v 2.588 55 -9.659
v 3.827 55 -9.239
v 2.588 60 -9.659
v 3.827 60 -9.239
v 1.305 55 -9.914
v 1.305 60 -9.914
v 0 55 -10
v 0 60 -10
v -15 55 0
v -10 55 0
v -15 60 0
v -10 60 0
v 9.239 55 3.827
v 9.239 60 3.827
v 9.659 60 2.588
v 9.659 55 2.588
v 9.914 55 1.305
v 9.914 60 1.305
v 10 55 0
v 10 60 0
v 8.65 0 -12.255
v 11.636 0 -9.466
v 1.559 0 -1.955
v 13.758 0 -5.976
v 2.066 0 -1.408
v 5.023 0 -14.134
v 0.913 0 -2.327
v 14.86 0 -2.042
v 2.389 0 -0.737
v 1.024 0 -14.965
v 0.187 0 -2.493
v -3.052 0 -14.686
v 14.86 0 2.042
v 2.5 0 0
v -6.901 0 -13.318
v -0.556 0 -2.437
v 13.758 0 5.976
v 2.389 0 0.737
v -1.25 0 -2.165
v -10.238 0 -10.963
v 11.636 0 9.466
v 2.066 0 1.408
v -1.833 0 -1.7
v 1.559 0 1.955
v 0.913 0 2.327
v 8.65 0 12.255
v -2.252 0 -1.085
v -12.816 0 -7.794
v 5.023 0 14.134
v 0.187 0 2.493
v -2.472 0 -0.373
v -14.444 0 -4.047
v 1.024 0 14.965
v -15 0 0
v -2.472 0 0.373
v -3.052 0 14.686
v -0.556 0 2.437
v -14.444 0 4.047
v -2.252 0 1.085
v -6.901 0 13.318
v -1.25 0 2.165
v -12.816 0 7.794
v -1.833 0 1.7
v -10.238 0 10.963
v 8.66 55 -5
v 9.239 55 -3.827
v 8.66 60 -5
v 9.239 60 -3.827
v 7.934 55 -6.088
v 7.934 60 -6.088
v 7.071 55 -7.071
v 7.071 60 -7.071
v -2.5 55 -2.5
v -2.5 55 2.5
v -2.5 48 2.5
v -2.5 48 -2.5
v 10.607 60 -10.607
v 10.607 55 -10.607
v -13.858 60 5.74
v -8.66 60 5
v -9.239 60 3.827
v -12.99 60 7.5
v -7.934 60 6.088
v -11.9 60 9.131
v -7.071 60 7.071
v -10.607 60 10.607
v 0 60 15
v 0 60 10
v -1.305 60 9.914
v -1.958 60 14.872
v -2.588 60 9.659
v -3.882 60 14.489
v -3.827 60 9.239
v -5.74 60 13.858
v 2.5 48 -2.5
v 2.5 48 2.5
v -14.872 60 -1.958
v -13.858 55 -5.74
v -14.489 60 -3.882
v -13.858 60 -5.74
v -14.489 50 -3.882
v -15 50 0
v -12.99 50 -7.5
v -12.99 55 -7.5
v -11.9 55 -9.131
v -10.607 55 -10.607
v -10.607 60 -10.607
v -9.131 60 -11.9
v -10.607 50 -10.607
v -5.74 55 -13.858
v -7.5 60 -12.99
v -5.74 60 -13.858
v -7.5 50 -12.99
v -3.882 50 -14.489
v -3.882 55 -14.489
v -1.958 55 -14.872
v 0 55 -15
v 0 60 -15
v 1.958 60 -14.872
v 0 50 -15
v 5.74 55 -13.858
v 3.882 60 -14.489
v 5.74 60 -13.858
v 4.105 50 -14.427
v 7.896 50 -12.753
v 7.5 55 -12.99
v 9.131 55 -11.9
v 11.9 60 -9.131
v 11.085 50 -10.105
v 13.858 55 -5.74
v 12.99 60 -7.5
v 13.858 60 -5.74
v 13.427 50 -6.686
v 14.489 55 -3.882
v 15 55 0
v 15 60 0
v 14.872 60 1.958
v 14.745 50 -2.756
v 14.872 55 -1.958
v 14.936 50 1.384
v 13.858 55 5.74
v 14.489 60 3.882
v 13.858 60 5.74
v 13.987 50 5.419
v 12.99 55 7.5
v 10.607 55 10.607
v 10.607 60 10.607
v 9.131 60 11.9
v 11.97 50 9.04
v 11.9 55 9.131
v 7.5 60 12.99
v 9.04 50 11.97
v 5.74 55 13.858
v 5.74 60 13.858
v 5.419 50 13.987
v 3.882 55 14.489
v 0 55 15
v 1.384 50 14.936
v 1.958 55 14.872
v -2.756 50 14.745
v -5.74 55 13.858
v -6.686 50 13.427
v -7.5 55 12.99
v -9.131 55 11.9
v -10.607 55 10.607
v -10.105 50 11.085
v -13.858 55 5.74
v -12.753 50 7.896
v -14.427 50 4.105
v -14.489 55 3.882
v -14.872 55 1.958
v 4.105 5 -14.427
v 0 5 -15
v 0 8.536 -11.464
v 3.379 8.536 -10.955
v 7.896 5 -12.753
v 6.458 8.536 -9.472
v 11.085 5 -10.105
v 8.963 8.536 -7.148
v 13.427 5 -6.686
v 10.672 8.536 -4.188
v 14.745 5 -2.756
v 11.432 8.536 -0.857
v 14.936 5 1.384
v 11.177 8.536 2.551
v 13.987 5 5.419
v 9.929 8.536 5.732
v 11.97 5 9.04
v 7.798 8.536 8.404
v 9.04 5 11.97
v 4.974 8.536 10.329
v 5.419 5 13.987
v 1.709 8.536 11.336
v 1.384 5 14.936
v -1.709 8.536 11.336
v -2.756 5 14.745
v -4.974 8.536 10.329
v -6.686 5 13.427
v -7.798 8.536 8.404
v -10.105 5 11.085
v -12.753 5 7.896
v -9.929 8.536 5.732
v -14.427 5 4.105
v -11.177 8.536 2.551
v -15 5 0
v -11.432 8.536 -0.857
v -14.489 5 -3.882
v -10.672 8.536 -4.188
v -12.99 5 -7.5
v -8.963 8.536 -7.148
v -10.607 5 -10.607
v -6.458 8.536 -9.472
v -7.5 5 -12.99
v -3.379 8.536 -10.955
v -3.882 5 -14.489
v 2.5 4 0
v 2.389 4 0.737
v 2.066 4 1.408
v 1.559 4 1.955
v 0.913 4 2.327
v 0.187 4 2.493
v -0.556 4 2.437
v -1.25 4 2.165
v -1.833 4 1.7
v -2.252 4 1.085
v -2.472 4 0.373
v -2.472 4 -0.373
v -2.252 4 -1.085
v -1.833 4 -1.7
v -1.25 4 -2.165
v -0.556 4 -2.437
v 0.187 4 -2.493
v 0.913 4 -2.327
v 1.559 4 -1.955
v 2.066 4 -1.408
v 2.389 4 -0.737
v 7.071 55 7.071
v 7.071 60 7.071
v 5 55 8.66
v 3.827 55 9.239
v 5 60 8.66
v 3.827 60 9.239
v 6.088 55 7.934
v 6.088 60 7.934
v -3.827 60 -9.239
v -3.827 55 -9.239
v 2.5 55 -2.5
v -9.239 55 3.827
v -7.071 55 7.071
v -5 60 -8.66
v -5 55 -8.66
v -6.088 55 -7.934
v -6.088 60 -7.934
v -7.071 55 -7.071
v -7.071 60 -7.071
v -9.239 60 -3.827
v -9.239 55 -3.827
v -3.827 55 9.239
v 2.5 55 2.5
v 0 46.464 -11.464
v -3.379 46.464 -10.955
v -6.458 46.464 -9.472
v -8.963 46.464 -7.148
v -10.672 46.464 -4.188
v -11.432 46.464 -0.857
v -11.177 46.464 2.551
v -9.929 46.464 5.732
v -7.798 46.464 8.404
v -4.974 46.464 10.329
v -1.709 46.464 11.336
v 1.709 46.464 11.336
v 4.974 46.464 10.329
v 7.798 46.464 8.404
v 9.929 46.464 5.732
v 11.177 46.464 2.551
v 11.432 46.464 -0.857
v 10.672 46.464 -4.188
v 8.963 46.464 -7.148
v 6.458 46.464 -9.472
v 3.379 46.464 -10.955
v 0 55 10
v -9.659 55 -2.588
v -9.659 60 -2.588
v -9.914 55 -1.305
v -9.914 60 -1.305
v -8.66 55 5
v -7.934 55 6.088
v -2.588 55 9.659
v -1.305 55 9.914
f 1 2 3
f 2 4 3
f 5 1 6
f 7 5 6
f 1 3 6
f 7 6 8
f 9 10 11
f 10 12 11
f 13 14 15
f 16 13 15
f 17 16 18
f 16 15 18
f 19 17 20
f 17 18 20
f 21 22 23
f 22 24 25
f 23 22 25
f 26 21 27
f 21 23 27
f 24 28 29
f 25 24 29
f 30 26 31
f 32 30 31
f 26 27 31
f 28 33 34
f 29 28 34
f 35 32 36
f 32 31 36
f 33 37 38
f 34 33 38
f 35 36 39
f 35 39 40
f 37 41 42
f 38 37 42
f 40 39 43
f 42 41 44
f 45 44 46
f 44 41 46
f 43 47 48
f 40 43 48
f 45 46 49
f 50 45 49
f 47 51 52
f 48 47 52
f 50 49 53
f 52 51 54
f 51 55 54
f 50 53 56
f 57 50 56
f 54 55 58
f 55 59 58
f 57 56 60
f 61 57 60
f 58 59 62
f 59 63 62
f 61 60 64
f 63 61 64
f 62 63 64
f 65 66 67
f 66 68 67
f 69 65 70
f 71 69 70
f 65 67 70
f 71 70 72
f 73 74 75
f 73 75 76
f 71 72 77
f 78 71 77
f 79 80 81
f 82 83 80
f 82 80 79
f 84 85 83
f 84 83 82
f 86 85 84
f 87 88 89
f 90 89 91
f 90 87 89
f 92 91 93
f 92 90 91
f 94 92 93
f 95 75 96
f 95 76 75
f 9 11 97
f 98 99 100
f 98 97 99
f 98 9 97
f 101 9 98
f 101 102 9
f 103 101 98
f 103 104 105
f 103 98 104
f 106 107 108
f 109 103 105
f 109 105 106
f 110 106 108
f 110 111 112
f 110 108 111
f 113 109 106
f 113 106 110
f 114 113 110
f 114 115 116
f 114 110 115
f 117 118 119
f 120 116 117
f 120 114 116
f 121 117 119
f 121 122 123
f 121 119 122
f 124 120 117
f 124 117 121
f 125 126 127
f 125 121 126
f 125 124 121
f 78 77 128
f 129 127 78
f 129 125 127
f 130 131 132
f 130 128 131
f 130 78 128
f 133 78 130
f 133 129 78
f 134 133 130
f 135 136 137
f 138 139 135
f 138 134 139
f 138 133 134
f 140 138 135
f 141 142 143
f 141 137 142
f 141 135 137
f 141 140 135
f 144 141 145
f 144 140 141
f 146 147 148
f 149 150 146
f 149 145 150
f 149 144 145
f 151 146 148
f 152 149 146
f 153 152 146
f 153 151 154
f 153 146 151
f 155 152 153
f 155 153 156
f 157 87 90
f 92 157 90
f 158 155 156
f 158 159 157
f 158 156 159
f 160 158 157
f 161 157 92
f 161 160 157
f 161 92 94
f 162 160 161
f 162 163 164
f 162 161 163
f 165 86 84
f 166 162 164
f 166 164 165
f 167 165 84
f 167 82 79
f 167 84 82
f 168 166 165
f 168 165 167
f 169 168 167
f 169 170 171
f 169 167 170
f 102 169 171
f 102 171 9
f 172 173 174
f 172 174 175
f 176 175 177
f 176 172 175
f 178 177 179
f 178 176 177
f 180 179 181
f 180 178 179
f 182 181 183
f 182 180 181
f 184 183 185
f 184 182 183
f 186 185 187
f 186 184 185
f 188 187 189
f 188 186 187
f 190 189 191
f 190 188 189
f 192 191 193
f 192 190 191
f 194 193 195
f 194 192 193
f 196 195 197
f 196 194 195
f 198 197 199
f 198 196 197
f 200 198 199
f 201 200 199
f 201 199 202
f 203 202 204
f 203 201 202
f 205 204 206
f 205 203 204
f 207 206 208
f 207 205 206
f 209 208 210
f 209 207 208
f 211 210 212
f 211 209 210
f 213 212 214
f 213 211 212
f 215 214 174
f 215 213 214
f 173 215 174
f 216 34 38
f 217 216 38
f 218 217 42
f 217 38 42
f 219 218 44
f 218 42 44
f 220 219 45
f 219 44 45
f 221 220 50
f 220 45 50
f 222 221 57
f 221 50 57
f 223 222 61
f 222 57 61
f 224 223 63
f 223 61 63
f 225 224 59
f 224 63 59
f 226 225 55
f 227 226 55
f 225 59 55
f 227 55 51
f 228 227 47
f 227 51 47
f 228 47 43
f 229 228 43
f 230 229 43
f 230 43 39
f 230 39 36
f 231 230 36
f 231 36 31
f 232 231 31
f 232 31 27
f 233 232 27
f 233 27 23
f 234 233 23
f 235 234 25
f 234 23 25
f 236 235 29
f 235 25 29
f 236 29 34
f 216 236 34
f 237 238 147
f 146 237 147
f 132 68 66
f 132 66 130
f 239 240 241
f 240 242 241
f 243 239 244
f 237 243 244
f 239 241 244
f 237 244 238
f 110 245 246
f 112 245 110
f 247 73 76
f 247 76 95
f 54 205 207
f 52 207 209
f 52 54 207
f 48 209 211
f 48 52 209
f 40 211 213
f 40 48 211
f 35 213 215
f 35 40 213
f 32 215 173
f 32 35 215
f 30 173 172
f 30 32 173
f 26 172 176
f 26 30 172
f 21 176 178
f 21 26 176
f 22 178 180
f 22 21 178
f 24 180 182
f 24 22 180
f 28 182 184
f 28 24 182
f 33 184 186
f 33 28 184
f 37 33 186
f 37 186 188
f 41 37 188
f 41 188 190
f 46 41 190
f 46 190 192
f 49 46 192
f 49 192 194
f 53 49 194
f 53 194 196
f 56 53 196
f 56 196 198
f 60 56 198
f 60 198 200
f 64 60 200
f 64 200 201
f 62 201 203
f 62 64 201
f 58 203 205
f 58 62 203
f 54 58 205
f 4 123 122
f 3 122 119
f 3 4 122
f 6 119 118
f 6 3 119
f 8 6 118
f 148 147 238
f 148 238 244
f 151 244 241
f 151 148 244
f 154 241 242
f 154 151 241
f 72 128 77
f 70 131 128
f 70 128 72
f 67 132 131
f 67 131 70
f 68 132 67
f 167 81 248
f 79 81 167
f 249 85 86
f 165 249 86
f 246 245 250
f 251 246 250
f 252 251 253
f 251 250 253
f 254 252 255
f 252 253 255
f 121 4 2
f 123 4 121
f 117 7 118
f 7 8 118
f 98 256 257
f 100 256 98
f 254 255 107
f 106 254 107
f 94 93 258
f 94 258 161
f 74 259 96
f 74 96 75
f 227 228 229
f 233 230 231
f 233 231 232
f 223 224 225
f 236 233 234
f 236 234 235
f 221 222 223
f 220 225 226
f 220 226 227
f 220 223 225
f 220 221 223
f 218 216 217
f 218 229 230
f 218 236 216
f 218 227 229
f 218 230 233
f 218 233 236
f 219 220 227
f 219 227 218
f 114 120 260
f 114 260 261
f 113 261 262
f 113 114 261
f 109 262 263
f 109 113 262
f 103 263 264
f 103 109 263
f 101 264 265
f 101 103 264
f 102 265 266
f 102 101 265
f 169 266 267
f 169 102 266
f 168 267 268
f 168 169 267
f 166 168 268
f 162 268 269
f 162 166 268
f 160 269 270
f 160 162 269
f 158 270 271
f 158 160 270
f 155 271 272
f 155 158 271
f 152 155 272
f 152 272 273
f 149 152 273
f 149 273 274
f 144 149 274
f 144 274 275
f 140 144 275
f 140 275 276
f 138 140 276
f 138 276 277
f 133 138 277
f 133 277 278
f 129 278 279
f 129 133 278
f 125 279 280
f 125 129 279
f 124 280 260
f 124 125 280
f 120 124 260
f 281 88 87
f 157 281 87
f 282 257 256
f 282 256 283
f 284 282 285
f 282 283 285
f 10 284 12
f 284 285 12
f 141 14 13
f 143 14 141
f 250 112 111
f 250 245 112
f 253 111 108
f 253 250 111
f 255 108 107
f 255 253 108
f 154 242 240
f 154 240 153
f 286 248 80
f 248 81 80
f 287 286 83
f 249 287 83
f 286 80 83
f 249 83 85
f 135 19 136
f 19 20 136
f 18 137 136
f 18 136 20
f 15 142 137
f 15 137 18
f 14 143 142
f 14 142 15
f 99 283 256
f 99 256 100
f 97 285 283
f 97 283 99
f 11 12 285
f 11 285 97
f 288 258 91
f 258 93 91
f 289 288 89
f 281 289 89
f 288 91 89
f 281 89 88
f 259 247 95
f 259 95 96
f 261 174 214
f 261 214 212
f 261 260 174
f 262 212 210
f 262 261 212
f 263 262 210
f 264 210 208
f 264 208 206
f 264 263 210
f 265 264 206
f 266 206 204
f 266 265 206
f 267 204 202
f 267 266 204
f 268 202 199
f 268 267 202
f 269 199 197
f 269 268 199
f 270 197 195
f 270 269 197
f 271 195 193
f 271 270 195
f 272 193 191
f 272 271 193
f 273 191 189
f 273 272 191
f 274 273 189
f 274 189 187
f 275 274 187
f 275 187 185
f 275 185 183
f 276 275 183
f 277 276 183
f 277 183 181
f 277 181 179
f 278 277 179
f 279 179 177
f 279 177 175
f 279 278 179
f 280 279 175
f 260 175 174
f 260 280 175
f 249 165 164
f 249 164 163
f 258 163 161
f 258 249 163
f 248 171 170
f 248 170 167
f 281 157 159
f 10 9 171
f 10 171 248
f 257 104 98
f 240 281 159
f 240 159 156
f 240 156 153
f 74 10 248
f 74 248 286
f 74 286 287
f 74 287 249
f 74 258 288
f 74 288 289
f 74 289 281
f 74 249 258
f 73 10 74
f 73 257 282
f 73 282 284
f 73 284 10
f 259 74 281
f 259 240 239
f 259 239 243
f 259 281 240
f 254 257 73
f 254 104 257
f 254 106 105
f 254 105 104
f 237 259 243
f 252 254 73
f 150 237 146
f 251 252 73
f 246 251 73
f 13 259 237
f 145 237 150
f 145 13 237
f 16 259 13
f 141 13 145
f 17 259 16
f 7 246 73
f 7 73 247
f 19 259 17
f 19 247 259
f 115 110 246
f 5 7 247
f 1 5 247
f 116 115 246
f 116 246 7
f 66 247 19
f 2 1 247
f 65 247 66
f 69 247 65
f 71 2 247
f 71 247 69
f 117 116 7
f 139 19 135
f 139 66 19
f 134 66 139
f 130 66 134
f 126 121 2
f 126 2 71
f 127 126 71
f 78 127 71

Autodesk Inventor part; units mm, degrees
ref_plane "YZ Plane" through (0, 0, 0) normal (1, 0, 0) x (0, 1, 0)
ref_plane "XZ Plane" through (0, 0, 0) normal (0, 1, 0) x (-1, 0, 0)
ref_plane "XY Plane" through (0, 0, 0) normal (0, 0, 1) x (1, 0, 0)
sketch "Sketch1" plane through (0, 0, 0) normal (0, 1, 0) x (-1, 0, 0)
  circle A0 centre (0, 0) radius 15
  dimension "d0" = 30
extrude "Extrusion1" add sketch "Sketch1" along normal blind 60
sketch "Sketch2" plane through (0, 60, 0) normal (0, 1, 0) x (1, 0, 0)
  arc A0 (-3.8268, -9.2388) -> (0, -10) centre (0, 0) ccw
  line L0 (0, -10) -> (0, -15)
  circle A1 centre (0, 0) radius 15 projected
  line L1 (-3.8268, -9.2388) -> (-5.7403, -13.8582)
  arc A2 (-5.7403, -13.8582) -> (0, -15) centre (0, 0) ccw
  arc A3 (3.8268, -9.2388) -> (7.0711, -7.0711) centre (0, 0) ccw
  line L2 (7.0711, -7.0711) -> (10.6066, -10.6066)
  line L3 (3.8268, -9.2388) -> (5.7403, -13.8582)
  arc A4 (5.7403, -13.8582) -> (10.6066, -10.6066) centre (0, 0) ccw
  arc A5 (9.2388, -3.8268) -> (10, 0) centre (0, 0) ccw
  line L4 (10, 0) -> (15, 0)
  line L5 (9.2388, -3.8268) -> (13.8582, -5.7403)
  arc A6 (13.8582, -5.7403) -> (15, 0) centre (0, 0) ccw
  arc A7 (9.2388, 3.8268) -> (7.0711, 7.0711) centre (0, 0) ccw
  line L6 (7.0711, 7.0711) -> (10.6066, 10.6066)
  line L7 (9.2388, 3.8268) -> (13.8582, 5.7403)
  arc A8 (13.8582, 5.7403) -> (10.6066, 10.6066) centre (0, 0) ccw
  arc A9 (3.8268, 9.2388) -> (0, 10) centre (0, 0) ccw
  line L8 (0, 10) -> (0, 15)
  line L9 (3.8268, 9.2388) -> (5.7403, 13.8582)
  arc A10 (5.7403, 13.8582) -> (0, 15) centre (0, 0) ccw
  arc A11 (-3.8268, 9.2388) -> (-7.0711, 7.0711) centre (0, 0) ccw
  line L10 (-7.0711, 7.0711) -> (-10.6066, 10.6066)
  line L11 (-3.8268, 9.2388) -> (-5.7403, 13.8582)
  arc A12 (-5.7403, 13.8582) -> (-10.6066, 10.6066) centre (0, 0) ccw
  arc A13 (-9.2388, 3.8268) -> (-10, 0) centre (0, 0) ccw
  line L12 (-10, 0) -> (-15, 0)
  line L13 (-9.2388, 3.8268) -> (-13.8582, 5.7403)
  arc A14 (-13.8582, 5.7403) -> (-15, 0) centre (0, 0) ccw
  arc A15 (-9.2388, -3.8268) -> (-7.0711, -7.0711) centre (0, 0) ccw
  line L14 (-7.0711, -7.0711) -> (-10.6066, -10.6066)
  line L15 (-9.2388, -3.8268) -> (-13.8582, -5.7403)
  arc A16 (-13.8582, -5.7403) -> (-10.6066, -10.6066) centre (0, 0) ccw
  point P0 (15, 0)
  dimension "d3" = 20
  dimension "d7" = 360
extrude "Extrusion2" cut sketch "Sketch2" against normal blind 5 contours L1 A1 L14 A15 L15 L12 A13 L13 L10 A11 L11 L8 A9 L9 L6 A7 L7 L4 A5 L5 L2 A3 L3 L0 A0
sketch "Sketch3" plane through (0, 0, 0) normal (1, 0, 0) x (0, 1, 0)
  line L0 (0, 15) -> (60, 15) projected
  line L1 (55, -13.8582) -> (55, -15) projected
  line L2 (0, -15) -> (60, -15) projected
  line L3 (50, -15) -> (46.4645, -11.4645)
  line L4 (0, -15) -> (0, 15) projected
  line L5 (0, -15) -> (5, -15)
  line L6 (5, -15) -> (8.5355, -11.4645)
  line L7 (8.5355, -11.4645) -> (46.4645, -11.4645)
  line L8 (46.4645, -11.4645) -> (8.5355, -11.4645)
  line L9 (50, -15) -> (50, -20)
  line L10 (50, -20) -> (5, -20)
  line L11 (5, -20) -> (5, -15)
  line L12 (0, 0) -> (62.9673, 0)
  dimension "d13" = 5
  dimension "d16" = 5
  dimension "d17" = 5
revolve "Revolution1" cut sketch "Sketch3" angle 360 about axis through (0, 0, 0) along (0, 1, 0)
sketch "Sketch4" plane through (0, 0, 0) normal (0, -1, 0) x (1, 0, 0)
  circle A0 centre (0, 0) radius 11.4645 projected
  circle A1 centre (0, 0) radius 2.5
  dimension "d19" = 5
extrude "Extrusion3" cut sketch "Sketch4" against normal blind 4 contours A1
sketch "Sketch5" plane through (0, 55, 0) normal (0, 1, 0) x (1, 0, 0)
  line L0 (-2.5, 2.5) -> (2.5, 2.5)
  line L1 (2.5, 2.5) -> (2.5, -2.5)
  line L2 (2.5, -2.5) -> (-2.5, -2.5)
  line L3 (-2.5, -2.5) -> (-2.5, 2.5)
  point P0 (0, 0)
  dimension "d22" = 2.5
  dimension "d23" = 2.5
  dimension "d24" = 2.5
  dimension "d25" = 2.5
extrude "Extrusion4" cut sketch "Sketch5" against normal blind 7
properties part number "TowerUntagged"
